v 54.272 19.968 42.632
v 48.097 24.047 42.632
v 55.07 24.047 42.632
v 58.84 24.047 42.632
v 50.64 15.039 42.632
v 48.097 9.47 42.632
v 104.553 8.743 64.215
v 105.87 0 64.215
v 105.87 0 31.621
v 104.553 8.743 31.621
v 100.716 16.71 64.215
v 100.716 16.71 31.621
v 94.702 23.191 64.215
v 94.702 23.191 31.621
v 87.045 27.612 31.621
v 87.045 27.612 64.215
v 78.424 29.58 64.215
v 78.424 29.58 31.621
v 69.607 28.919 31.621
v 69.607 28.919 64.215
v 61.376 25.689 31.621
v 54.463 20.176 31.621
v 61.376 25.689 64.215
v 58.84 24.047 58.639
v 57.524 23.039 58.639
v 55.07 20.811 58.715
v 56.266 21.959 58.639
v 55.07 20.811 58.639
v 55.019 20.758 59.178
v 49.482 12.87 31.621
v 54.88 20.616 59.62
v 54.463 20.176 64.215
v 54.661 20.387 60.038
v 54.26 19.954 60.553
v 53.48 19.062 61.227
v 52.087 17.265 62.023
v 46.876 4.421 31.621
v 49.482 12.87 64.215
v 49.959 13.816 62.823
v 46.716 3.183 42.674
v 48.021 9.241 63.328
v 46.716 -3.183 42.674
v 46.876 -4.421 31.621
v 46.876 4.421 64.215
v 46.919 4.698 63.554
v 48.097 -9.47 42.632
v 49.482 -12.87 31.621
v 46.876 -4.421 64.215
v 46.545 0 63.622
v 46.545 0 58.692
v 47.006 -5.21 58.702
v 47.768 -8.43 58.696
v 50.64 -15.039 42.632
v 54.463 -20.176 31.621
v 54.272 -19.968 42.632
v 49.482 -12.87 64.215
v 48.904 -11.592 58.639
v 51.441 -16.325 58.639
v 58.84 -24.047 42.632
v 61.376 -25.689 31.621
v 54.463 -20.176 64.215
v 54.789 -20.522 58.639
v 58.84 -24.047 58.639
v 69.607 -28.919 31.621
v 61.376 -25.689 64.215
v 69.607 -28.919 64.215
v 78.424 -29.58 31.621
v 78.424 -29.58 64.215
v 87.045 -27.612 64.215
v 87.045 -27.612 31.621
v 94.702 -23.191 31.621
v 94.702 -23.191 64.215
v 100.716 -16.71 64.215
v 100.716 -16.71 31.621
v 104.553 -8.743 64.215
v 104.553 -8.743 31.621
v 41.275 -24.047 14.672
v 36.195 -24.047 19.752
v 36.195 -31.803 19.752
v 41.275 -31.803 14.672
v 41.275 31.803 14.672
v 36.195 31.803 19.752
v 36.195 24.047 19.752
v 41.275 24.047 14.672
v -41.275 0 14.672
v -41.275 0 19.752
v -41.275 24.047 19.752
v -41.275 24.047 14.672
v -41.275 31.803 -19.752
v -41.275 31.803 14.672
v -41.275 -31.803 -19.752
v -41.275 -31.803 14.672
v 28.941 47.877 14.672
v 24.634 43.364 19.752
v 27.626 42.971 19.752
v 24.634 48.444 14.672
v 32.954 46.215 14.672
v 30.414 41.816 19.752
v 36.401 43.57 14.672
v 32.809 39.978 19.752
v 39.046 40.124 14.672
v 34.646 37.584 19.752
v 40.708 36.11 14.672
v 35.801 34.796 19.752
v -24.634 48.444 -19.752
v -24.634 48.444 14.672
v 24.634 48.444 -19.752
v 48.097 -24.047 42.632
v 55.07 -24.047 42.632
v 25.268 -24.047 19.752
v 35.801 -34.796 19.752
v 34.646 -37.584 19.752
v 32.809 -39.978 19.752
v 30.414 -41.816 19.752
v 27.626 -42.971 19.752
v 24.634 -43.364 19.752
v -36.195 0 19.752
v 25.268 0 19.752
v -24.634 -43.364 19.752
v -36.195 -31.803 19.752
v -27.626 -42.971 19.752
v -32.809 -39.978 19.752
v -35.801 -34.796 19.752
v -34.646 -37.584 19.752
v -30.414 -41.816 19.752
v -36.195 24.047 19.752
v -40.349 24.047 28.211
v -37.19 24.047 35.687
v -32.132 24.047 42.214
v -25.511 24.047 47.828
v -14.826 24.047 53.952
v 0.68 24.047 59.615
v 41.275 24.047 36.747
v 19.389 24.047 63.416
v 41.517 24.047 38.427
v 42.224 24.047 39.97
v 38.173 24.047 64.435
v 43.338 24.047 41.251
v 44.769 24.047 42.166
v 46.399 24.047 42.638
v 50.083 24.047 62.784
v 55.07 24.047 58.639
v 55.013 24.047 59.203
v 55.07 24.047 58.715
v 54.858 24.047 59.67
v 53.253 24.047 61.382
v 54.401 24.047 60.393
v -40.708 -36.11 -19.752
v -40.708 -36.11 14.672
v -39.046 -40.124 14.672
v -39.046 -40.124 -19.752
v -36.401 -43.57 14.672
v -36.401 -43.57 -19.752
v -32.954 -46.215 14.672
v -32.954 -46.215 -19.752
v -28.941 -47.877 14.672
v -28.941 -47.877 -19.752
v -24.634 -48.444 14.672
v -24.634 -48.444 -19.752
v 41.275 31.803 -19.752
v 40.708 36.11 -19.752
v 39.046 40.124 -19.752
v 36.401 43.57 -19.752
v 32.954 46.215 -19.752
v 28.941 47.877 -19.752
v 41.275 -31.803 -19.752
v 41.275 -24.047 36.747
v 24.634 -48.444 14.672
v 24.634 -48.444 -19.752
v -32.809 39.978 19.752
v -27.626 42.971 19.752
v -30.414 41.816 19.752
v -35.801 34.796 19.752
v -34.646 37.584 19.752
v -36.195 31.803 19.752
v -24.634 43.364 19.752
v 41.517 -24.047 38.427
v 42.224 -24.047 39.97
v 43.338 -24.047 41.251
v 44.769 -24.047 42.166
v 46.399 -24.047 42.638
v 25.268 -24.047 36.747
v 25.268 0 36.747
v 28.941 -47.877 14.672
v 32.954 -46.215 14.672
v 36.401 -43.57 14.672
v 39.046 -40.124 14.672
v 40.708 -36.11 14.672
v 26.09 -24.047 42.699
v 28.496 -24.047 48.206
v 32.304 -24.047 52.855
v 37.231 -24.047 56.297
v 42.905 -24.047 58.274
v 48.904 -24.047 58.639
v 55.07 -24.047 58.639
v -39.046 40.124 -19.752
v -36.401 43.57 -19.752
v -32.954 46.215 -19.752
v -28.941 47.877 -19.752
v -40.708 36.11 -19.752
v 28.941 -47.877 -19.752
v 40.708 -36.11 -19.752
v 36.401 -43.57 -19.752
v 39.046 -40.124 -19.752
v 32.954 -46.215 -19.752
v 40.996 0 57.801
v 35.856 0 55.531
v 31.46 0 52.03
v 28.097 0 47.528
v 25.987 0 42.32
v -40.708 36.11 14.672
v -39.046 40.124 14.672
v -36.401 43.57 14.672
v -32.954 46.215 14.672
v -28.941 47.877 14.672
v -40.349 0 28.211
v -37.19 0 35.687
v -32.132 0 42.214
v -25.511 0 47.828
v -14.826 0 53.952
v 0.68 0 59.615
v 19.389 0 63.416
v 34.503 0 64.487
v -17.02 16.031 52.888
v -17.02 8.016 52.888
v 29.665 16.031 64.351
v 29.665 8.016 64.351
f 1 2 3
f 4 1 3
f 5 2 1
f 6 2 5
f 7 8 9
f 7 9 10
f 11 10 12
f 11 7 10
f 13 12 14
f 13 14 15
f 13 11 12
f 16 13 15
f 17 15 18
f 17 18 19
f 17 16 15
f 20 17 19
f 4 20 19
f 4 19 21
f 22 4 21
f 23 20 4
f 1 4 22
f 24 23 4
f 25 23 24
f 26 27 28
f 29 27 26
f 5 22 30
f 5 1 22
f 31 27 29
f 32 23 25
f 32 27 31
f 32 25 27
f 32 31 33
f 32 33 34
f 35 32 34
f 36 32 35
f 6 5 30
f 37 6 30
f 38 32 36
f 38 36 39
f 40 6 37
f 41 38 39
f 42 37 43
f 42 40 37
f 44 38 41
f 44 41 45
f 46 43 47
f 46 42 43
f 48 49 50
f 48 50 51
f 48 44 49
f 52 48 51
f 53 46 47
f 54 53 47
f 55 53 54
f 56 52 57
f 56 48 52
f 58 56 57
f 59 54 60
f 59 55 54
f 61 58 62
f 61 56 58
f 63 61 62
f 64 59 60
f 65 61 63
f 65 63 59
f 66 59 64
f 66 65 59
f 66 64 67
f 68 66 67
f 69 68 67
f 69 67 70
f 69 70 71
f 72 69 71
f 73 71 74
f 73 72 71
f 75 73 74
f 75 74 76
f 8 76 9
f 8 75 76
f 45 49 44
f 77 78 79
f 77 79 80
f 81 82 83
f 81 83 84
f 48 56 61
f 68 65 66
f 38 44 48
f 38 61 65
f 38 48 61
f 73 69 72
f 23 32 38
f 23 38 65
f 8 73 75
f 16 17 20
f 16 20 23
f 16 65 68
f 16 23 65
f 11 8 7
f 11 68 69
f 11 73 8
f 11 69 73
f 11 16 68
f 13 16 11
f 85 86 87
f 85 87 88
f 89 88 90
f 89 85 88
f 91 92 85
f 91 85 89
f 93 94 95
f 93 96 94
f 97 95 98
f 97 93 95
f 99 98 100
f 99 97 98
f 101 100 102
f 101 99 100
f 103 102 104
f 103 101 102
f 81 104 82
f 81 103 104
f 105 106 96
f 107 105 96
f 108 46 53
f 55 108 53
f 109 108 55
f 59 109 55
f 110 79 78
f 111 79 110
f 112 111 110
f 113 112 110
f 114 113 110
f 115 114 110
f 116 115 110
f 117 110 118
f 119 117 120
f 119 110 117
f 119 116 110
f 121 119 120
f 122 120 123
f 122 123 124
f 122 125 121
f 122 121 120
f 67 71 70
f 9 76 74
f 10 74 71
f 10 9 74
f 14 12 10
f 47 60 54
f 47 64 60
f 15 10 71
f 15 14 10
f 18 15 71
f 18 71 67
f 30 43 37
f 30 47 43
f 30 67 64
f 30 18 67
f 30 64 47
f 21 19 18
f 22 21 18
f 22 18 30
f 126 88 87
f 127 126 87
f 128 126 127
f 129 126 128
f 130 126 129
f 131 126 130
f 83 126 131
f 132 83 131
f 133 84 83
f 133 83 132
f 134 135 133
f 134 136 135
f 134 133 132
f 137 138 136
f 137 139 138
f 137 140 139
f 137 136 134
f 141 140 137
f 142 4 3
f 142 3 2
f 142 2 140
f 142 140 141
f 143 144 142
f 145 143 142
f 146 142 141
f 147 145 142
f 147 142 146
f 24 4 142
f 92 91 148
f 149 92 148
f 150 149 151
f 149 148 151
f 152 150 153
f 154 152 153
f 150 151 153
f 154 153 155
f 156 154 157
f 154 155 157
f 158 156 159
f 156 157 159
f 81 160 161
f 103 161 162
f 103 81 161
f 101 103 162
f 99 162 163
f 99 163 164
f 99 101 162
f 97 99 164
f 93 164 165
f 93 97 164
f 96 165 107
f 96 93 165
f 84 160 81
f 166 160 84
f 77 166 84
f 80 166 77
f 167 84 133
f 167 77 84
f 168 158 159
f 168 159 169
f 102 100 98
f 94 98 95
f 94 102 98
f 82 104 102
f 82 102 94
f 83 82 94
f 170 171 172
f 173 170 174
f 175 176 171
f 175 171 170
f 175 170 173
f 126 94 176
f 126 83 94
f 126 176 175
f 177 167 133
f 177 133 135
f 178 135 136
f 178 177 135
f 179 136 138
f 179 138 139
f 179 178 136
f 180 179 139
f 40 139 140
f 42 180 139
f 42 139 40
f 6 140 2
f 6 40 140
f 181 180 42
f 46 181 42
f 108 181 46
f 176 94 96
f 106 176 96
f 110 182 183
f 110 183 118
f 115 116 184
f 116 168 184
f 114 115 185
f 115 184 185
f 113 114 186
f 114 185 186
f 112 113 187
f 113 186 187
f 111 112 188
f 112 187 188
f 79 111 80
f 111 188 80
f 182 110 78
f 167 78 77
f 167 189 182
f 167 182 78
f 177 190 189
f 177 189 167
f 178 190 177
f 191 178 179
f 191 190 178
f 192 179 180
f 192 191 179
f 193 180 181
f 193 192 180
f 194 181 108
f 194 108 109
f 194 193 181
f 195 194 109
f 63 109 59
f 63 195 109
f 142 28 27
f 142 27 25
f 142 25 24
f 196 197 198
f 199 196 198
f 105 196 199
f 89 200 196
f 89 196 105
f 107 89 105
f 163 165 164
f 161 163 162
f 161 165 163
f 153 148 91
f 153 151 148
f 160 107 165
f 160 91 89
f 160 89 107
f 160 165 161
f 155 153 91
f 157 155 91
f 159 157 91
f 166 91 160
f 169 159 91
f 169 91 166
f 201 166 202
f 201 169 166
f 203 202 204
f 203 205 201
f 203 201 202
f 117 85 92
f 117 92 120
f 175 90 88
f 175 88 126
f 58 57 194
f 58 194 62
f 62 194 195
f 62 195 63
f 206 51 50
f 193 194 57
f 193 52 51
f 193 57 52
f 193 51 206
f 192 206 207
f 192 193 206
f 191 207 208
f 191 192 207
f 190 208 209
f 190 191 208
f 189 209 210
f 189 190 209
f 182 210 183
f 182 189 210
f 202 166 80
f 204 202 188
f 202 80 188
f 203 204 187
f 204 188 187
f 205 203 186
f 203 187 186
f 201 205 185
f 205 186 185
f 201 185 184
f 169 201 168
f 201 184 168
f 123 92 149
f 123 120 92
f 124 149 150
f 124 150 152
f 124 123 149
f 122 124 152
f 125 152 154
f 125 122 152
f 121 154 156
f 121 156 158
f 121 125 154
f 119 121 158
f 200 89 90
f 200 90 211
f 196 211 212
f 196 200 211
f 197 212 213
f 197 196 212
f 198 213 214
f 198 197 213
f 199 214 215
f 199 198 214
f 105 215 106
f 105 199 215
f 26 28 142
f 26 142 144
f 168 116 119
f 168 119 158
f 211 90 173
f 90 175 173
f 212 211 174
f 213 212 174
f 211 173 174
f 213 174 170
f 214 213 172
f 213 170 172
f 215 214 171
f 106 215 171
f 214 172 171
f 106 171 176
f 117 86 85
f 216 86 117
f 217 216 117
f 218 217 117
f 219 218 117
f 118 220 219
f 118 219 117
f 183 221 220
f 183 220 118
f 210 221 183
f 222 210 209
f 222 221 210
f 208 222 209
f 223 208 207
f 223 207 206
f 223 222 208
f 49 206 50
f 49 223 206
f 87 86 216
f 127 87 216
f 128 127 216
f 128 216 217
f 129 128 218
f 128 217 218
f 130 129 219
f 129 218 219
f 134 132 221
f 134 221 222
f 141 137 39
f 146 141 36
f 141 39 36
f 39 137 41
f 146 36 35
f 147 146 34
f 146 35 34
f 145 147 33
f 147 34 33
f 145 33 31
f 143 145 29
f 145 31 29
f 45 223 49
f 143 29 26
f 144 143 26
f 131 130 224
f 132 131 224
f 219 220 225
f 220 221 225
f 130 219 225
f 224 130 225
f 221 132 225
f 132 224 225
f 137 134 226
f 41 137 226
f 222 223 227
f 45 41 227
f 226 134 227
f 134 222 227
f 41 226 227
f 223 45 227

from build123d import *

# Parameters (mm, degrees)
F1_DEPTH     = 48.44446
F0_W         = 21.137111498
F0_H         = 16.0069091111
F2_DEPTH     = 24.04666
F3_DEPTH     = 24.04666
F4_DEPTH     = 15.49987
F5_DEPTH     = 16.86318
F7_R         = 16.6410292326
F8_T1_DEPTH  = 49.2679415348
F8_T3_DEPTH  = 7.7567707674
F8_T5_DEPTH  = 31.8034307674
F8_T7_DEPTH  = 7.7567707674
F8_T10_ANGLE = 90
F8_T12_ANGLE = 90
F8_T14_ANGLE = 90
F8_T16_ANGLE = 90


# Not quite as in the source:
# - a fillet or chamfer that OpenCascade refuses, or shapes differently, is made with other operations: its cross-section is extruded or revolved along the edge and cut away or added


with BuildPart() as f1:
    # F0 (on Front) → F1 (new body, symmetric)
    with BuildSketch(Plane.XZ):
        Polygon((-41.275, -19.751769717), (41.275, -19.751769717), (41.275, 19.751769717), (25.2680908889, 19.751769717), (-41.275, 19.751769717), align=None)
    extrude(amount=F1_DEPTH, both=True)

    # F0 (on Front) → F2 (join, symmetric)
    with BuildSketch(Plane.XZ):
        with BuildLine():
            Line((25.2680908889, 19.751769717), (41.275, 19.751769717))
            Line((41.275, 19.751769717), (41.275, 36.7465044527))
            ThreePointArc((41.275, 36.7465044527), (43.3382033754, 41.2513095059), (48.0968345152, 42.6317103213))
            Line((48.0968345152, 42.6317103213), (55.0704259122, 42.6317103213))
            Line((55.0704259122, 42.6317103213), (55.0704259122, 58.6386194325))
            Line((55.0704259122, 58.6386194325), (48.9036156195, 58.6386194325))
            ThreePointArc((48.9036156195, 58.6386194325), (32.3044367766, 52.8547533301), (25.2680908889, 36.7465044527))
            Line((25.2680908889, 36.7465044527), (25.2680908889, 19.751769717))
        make_face()
        with Locations((65.6389816612, 50.6351648769)):
            Rectangle(F0_W, F0_H)
        Polygon((76.2075374102, 64.215389511), (76.2075374102, 58.6386194325), (76.2075374102, 42.6317103213), (76.2075374102, 31.6205449668), (105.8704259122, 31.6205449668), (105.8704259122, 64.215389511), align=None)
    extrude(amount=F2_DEPTH, both=True)

    # F0 (on Front) → F3 (join, through all)
    with BuildSketch(Plane.XZ):
        with BuildLine():
            add(Edge.make_bspline(
                [(-41.275, 19.751769717), (-42.804622746, 65.2502314703), (54.8739225948, 71.3754703993), (55.0704259122, 58.7153048291)],
                knots=[0, 0, 0, 0, 103.688468472, 103.688468472, 103.688468472, 103.688468472], degree=3))
            Line((-41.275, 19.751769717), (25.2680908889, 19.751769717))
            Line((25.2680908889, 19.751769717), (25.2680908889, 36.7465044527))
            ThreePointArc((25.2680908889, 36.7465044527), (32.3044367766, 52.8547533301), (48.9036156195, 58.6386194325))
            Line((48.9036156195, 58.6386194325), (55.0704259122, 58.6386194325))
            Line((55.0704259122, 58.6386194325), (55.0704259122, 58.7153048291))
        make_face()
    extrude(amount=-F3_DEPTH)

    # F4 (add): a face of the model
    f4_faces = [f1.faces().sort_by_distance(p)[0] for p in [
        (105.8704259122, 0, 47.9179672389),
    ]]
    extrude(f4_faces, amount=-F4_DEPTH)

    # F5 (cut): a face of the model
    f5_faces = [f1.faces().sort_by_distance(p)[0] for p in [
        (105.8704259122, 0, 47.9179672389),
    ]]
    extrude(f5_faces, amount=-F5_DEPTH, mode=Mode.SUBTRACT)

    # F0 (on Front) → F6 (revolve)
    with BuildSketch(Plane.XZ):
        Polygon((76.2075374102, 64.215389511), (76.2075374102, 58.6386194325), (76.2075374102, 42.6317103213), (76.2075374102, 31.6205449668), (105.8704259122, 31.6205449668), (105.8704259122, 64.215389511), align=None)
    revolve(axis=Axis((76.2075374102, 0, 47.9179672389), (0, 0, 1)))

    # F7
    f7_edges = [f1.edges().sort_by_distance(p)[0] for p in [
        (-41.275, -48.44446, 0),
        (41.275, -48.44446, 0),
        (41.275, 48.44446, 0),
        (-41.275, 48.44446, 0),
    ]]
    fillet(f7_edges, radius=F7_R)

    # F8: chamfer of 5.08 on 2 edges, made by hand

    # F8_s2 → F8_t1 (cut)
    with BuildSketch(Plane.YZ.offset(-24.6339707674)):
        Polygon((43.36446, 19.751769717), (48.44446, 14.671769717), (48.44446, 19.751769717), align=None)
        Polygon((-43.36446, 19.751769717), (-48.44446, 14.671769717), (-48.44446, 19.751769717), align=None)
    extrude(amount=F8_T1_DEPTH, mode=Mode.SUBTRACT)

    # F8_s4 → F8_t3 (cut)
    with BuildSketch(Plane.XZ.offset(24.04666)):
        Polygon((36.195, 19.751769717), (41.275, 14.671769717), (41.275, 19.751769717), align=None)
    extrude(amount=F8_T3_DEPTH, mode=Mode.SUBTRACT)

    # F8_s6 → F8_t5 (cut)
    with BuildSketch(Plane.XZ):
        Polygon((-41.275, 14.671769717), (-36.195, 19.751769717), (-41.275, 19.751769717), align=None)
    extrude(amount=F8_T5_DEPTH, mode=Mode.SUBTRACT)

    # F8_s8 → F8_t7 (cut)
    with BuildSketch(Plane.XZ.offset(-31.8034307674)):
        Polygon((-41.275, 14.671769717), (-36.195, 19.751769717), (-41.275, 19.751769717), align=None)
        Polygon((36.195, 19.751769717), (41.275, 14.671769717), (41.275, 19.751769717), align=None)
    extrude(amount=F8_T7_DEPTH, mode=Mode.SUBTRACT)

    # F8_s9 → F8_t10 (revolve, cut)
    with BuildSketch(Plane.XZ.offset(31.8034307674)):
        Polygon((-41.275, 14.671769717), (-36.195, 19.751769717), (-41.275, 19.751769717), align=None)
    revolve(axis=Axis((-24.6339707674, -31.8034307674, 19.751769717), (0, 0, 1)), revolution_arc=F8_T10_ANGLE, mode=Mode.SUBTRACT)

    # F8_s11 → F8_t12 (revolve, cut)
    with BuildSketch(Plane.YZ.offset(24.6339707674)):
        Polygon((-43.36446, 19.751769717), (-48.44446, 14.671769717), (-48.44446, 19.751769717), align=None)
    revolve(axis=Axis((24.6339707674, -31.8034307674, 19.751769717), (0, 0, 1)), revolution_arc=F8_T12_ANGLE, mode=Mode.SUBTRACT)

    # F8_s13 → F8_t14 (revolve, cut)
    with BuildSketch(Plane.YZ.offset(24.6339707674)):
        Polygon((43.36446, 19.751769717), (48.44446, 14.671769717), (48.44446, 19.751769717), align=None)
    revolve(axis=Axis((24.6339707674, 31.8034307674, 19.751769717), (0, 0, -1)), revolution_arc=F8_T14_ANGLE, mode=Mode.SUBTRACT)

    # F8_s15 → F8_t16 (revolve, cut)
    with BuildSketch(Plane.XZ.offset(-31.8034307674)):
        Polygon((-41.275, 14.671769717), (-36.195, 19.751769717), (-41.275, 19.751769717), align=None)
    revolve(axis=Axis((-24.6339707674, 31.8034307674, 19.751769717), (0, 0, -1)), revolution_arc=F8_T16_ANGLE, mode=Mode.SUBTRACT)


solid = f1.part
